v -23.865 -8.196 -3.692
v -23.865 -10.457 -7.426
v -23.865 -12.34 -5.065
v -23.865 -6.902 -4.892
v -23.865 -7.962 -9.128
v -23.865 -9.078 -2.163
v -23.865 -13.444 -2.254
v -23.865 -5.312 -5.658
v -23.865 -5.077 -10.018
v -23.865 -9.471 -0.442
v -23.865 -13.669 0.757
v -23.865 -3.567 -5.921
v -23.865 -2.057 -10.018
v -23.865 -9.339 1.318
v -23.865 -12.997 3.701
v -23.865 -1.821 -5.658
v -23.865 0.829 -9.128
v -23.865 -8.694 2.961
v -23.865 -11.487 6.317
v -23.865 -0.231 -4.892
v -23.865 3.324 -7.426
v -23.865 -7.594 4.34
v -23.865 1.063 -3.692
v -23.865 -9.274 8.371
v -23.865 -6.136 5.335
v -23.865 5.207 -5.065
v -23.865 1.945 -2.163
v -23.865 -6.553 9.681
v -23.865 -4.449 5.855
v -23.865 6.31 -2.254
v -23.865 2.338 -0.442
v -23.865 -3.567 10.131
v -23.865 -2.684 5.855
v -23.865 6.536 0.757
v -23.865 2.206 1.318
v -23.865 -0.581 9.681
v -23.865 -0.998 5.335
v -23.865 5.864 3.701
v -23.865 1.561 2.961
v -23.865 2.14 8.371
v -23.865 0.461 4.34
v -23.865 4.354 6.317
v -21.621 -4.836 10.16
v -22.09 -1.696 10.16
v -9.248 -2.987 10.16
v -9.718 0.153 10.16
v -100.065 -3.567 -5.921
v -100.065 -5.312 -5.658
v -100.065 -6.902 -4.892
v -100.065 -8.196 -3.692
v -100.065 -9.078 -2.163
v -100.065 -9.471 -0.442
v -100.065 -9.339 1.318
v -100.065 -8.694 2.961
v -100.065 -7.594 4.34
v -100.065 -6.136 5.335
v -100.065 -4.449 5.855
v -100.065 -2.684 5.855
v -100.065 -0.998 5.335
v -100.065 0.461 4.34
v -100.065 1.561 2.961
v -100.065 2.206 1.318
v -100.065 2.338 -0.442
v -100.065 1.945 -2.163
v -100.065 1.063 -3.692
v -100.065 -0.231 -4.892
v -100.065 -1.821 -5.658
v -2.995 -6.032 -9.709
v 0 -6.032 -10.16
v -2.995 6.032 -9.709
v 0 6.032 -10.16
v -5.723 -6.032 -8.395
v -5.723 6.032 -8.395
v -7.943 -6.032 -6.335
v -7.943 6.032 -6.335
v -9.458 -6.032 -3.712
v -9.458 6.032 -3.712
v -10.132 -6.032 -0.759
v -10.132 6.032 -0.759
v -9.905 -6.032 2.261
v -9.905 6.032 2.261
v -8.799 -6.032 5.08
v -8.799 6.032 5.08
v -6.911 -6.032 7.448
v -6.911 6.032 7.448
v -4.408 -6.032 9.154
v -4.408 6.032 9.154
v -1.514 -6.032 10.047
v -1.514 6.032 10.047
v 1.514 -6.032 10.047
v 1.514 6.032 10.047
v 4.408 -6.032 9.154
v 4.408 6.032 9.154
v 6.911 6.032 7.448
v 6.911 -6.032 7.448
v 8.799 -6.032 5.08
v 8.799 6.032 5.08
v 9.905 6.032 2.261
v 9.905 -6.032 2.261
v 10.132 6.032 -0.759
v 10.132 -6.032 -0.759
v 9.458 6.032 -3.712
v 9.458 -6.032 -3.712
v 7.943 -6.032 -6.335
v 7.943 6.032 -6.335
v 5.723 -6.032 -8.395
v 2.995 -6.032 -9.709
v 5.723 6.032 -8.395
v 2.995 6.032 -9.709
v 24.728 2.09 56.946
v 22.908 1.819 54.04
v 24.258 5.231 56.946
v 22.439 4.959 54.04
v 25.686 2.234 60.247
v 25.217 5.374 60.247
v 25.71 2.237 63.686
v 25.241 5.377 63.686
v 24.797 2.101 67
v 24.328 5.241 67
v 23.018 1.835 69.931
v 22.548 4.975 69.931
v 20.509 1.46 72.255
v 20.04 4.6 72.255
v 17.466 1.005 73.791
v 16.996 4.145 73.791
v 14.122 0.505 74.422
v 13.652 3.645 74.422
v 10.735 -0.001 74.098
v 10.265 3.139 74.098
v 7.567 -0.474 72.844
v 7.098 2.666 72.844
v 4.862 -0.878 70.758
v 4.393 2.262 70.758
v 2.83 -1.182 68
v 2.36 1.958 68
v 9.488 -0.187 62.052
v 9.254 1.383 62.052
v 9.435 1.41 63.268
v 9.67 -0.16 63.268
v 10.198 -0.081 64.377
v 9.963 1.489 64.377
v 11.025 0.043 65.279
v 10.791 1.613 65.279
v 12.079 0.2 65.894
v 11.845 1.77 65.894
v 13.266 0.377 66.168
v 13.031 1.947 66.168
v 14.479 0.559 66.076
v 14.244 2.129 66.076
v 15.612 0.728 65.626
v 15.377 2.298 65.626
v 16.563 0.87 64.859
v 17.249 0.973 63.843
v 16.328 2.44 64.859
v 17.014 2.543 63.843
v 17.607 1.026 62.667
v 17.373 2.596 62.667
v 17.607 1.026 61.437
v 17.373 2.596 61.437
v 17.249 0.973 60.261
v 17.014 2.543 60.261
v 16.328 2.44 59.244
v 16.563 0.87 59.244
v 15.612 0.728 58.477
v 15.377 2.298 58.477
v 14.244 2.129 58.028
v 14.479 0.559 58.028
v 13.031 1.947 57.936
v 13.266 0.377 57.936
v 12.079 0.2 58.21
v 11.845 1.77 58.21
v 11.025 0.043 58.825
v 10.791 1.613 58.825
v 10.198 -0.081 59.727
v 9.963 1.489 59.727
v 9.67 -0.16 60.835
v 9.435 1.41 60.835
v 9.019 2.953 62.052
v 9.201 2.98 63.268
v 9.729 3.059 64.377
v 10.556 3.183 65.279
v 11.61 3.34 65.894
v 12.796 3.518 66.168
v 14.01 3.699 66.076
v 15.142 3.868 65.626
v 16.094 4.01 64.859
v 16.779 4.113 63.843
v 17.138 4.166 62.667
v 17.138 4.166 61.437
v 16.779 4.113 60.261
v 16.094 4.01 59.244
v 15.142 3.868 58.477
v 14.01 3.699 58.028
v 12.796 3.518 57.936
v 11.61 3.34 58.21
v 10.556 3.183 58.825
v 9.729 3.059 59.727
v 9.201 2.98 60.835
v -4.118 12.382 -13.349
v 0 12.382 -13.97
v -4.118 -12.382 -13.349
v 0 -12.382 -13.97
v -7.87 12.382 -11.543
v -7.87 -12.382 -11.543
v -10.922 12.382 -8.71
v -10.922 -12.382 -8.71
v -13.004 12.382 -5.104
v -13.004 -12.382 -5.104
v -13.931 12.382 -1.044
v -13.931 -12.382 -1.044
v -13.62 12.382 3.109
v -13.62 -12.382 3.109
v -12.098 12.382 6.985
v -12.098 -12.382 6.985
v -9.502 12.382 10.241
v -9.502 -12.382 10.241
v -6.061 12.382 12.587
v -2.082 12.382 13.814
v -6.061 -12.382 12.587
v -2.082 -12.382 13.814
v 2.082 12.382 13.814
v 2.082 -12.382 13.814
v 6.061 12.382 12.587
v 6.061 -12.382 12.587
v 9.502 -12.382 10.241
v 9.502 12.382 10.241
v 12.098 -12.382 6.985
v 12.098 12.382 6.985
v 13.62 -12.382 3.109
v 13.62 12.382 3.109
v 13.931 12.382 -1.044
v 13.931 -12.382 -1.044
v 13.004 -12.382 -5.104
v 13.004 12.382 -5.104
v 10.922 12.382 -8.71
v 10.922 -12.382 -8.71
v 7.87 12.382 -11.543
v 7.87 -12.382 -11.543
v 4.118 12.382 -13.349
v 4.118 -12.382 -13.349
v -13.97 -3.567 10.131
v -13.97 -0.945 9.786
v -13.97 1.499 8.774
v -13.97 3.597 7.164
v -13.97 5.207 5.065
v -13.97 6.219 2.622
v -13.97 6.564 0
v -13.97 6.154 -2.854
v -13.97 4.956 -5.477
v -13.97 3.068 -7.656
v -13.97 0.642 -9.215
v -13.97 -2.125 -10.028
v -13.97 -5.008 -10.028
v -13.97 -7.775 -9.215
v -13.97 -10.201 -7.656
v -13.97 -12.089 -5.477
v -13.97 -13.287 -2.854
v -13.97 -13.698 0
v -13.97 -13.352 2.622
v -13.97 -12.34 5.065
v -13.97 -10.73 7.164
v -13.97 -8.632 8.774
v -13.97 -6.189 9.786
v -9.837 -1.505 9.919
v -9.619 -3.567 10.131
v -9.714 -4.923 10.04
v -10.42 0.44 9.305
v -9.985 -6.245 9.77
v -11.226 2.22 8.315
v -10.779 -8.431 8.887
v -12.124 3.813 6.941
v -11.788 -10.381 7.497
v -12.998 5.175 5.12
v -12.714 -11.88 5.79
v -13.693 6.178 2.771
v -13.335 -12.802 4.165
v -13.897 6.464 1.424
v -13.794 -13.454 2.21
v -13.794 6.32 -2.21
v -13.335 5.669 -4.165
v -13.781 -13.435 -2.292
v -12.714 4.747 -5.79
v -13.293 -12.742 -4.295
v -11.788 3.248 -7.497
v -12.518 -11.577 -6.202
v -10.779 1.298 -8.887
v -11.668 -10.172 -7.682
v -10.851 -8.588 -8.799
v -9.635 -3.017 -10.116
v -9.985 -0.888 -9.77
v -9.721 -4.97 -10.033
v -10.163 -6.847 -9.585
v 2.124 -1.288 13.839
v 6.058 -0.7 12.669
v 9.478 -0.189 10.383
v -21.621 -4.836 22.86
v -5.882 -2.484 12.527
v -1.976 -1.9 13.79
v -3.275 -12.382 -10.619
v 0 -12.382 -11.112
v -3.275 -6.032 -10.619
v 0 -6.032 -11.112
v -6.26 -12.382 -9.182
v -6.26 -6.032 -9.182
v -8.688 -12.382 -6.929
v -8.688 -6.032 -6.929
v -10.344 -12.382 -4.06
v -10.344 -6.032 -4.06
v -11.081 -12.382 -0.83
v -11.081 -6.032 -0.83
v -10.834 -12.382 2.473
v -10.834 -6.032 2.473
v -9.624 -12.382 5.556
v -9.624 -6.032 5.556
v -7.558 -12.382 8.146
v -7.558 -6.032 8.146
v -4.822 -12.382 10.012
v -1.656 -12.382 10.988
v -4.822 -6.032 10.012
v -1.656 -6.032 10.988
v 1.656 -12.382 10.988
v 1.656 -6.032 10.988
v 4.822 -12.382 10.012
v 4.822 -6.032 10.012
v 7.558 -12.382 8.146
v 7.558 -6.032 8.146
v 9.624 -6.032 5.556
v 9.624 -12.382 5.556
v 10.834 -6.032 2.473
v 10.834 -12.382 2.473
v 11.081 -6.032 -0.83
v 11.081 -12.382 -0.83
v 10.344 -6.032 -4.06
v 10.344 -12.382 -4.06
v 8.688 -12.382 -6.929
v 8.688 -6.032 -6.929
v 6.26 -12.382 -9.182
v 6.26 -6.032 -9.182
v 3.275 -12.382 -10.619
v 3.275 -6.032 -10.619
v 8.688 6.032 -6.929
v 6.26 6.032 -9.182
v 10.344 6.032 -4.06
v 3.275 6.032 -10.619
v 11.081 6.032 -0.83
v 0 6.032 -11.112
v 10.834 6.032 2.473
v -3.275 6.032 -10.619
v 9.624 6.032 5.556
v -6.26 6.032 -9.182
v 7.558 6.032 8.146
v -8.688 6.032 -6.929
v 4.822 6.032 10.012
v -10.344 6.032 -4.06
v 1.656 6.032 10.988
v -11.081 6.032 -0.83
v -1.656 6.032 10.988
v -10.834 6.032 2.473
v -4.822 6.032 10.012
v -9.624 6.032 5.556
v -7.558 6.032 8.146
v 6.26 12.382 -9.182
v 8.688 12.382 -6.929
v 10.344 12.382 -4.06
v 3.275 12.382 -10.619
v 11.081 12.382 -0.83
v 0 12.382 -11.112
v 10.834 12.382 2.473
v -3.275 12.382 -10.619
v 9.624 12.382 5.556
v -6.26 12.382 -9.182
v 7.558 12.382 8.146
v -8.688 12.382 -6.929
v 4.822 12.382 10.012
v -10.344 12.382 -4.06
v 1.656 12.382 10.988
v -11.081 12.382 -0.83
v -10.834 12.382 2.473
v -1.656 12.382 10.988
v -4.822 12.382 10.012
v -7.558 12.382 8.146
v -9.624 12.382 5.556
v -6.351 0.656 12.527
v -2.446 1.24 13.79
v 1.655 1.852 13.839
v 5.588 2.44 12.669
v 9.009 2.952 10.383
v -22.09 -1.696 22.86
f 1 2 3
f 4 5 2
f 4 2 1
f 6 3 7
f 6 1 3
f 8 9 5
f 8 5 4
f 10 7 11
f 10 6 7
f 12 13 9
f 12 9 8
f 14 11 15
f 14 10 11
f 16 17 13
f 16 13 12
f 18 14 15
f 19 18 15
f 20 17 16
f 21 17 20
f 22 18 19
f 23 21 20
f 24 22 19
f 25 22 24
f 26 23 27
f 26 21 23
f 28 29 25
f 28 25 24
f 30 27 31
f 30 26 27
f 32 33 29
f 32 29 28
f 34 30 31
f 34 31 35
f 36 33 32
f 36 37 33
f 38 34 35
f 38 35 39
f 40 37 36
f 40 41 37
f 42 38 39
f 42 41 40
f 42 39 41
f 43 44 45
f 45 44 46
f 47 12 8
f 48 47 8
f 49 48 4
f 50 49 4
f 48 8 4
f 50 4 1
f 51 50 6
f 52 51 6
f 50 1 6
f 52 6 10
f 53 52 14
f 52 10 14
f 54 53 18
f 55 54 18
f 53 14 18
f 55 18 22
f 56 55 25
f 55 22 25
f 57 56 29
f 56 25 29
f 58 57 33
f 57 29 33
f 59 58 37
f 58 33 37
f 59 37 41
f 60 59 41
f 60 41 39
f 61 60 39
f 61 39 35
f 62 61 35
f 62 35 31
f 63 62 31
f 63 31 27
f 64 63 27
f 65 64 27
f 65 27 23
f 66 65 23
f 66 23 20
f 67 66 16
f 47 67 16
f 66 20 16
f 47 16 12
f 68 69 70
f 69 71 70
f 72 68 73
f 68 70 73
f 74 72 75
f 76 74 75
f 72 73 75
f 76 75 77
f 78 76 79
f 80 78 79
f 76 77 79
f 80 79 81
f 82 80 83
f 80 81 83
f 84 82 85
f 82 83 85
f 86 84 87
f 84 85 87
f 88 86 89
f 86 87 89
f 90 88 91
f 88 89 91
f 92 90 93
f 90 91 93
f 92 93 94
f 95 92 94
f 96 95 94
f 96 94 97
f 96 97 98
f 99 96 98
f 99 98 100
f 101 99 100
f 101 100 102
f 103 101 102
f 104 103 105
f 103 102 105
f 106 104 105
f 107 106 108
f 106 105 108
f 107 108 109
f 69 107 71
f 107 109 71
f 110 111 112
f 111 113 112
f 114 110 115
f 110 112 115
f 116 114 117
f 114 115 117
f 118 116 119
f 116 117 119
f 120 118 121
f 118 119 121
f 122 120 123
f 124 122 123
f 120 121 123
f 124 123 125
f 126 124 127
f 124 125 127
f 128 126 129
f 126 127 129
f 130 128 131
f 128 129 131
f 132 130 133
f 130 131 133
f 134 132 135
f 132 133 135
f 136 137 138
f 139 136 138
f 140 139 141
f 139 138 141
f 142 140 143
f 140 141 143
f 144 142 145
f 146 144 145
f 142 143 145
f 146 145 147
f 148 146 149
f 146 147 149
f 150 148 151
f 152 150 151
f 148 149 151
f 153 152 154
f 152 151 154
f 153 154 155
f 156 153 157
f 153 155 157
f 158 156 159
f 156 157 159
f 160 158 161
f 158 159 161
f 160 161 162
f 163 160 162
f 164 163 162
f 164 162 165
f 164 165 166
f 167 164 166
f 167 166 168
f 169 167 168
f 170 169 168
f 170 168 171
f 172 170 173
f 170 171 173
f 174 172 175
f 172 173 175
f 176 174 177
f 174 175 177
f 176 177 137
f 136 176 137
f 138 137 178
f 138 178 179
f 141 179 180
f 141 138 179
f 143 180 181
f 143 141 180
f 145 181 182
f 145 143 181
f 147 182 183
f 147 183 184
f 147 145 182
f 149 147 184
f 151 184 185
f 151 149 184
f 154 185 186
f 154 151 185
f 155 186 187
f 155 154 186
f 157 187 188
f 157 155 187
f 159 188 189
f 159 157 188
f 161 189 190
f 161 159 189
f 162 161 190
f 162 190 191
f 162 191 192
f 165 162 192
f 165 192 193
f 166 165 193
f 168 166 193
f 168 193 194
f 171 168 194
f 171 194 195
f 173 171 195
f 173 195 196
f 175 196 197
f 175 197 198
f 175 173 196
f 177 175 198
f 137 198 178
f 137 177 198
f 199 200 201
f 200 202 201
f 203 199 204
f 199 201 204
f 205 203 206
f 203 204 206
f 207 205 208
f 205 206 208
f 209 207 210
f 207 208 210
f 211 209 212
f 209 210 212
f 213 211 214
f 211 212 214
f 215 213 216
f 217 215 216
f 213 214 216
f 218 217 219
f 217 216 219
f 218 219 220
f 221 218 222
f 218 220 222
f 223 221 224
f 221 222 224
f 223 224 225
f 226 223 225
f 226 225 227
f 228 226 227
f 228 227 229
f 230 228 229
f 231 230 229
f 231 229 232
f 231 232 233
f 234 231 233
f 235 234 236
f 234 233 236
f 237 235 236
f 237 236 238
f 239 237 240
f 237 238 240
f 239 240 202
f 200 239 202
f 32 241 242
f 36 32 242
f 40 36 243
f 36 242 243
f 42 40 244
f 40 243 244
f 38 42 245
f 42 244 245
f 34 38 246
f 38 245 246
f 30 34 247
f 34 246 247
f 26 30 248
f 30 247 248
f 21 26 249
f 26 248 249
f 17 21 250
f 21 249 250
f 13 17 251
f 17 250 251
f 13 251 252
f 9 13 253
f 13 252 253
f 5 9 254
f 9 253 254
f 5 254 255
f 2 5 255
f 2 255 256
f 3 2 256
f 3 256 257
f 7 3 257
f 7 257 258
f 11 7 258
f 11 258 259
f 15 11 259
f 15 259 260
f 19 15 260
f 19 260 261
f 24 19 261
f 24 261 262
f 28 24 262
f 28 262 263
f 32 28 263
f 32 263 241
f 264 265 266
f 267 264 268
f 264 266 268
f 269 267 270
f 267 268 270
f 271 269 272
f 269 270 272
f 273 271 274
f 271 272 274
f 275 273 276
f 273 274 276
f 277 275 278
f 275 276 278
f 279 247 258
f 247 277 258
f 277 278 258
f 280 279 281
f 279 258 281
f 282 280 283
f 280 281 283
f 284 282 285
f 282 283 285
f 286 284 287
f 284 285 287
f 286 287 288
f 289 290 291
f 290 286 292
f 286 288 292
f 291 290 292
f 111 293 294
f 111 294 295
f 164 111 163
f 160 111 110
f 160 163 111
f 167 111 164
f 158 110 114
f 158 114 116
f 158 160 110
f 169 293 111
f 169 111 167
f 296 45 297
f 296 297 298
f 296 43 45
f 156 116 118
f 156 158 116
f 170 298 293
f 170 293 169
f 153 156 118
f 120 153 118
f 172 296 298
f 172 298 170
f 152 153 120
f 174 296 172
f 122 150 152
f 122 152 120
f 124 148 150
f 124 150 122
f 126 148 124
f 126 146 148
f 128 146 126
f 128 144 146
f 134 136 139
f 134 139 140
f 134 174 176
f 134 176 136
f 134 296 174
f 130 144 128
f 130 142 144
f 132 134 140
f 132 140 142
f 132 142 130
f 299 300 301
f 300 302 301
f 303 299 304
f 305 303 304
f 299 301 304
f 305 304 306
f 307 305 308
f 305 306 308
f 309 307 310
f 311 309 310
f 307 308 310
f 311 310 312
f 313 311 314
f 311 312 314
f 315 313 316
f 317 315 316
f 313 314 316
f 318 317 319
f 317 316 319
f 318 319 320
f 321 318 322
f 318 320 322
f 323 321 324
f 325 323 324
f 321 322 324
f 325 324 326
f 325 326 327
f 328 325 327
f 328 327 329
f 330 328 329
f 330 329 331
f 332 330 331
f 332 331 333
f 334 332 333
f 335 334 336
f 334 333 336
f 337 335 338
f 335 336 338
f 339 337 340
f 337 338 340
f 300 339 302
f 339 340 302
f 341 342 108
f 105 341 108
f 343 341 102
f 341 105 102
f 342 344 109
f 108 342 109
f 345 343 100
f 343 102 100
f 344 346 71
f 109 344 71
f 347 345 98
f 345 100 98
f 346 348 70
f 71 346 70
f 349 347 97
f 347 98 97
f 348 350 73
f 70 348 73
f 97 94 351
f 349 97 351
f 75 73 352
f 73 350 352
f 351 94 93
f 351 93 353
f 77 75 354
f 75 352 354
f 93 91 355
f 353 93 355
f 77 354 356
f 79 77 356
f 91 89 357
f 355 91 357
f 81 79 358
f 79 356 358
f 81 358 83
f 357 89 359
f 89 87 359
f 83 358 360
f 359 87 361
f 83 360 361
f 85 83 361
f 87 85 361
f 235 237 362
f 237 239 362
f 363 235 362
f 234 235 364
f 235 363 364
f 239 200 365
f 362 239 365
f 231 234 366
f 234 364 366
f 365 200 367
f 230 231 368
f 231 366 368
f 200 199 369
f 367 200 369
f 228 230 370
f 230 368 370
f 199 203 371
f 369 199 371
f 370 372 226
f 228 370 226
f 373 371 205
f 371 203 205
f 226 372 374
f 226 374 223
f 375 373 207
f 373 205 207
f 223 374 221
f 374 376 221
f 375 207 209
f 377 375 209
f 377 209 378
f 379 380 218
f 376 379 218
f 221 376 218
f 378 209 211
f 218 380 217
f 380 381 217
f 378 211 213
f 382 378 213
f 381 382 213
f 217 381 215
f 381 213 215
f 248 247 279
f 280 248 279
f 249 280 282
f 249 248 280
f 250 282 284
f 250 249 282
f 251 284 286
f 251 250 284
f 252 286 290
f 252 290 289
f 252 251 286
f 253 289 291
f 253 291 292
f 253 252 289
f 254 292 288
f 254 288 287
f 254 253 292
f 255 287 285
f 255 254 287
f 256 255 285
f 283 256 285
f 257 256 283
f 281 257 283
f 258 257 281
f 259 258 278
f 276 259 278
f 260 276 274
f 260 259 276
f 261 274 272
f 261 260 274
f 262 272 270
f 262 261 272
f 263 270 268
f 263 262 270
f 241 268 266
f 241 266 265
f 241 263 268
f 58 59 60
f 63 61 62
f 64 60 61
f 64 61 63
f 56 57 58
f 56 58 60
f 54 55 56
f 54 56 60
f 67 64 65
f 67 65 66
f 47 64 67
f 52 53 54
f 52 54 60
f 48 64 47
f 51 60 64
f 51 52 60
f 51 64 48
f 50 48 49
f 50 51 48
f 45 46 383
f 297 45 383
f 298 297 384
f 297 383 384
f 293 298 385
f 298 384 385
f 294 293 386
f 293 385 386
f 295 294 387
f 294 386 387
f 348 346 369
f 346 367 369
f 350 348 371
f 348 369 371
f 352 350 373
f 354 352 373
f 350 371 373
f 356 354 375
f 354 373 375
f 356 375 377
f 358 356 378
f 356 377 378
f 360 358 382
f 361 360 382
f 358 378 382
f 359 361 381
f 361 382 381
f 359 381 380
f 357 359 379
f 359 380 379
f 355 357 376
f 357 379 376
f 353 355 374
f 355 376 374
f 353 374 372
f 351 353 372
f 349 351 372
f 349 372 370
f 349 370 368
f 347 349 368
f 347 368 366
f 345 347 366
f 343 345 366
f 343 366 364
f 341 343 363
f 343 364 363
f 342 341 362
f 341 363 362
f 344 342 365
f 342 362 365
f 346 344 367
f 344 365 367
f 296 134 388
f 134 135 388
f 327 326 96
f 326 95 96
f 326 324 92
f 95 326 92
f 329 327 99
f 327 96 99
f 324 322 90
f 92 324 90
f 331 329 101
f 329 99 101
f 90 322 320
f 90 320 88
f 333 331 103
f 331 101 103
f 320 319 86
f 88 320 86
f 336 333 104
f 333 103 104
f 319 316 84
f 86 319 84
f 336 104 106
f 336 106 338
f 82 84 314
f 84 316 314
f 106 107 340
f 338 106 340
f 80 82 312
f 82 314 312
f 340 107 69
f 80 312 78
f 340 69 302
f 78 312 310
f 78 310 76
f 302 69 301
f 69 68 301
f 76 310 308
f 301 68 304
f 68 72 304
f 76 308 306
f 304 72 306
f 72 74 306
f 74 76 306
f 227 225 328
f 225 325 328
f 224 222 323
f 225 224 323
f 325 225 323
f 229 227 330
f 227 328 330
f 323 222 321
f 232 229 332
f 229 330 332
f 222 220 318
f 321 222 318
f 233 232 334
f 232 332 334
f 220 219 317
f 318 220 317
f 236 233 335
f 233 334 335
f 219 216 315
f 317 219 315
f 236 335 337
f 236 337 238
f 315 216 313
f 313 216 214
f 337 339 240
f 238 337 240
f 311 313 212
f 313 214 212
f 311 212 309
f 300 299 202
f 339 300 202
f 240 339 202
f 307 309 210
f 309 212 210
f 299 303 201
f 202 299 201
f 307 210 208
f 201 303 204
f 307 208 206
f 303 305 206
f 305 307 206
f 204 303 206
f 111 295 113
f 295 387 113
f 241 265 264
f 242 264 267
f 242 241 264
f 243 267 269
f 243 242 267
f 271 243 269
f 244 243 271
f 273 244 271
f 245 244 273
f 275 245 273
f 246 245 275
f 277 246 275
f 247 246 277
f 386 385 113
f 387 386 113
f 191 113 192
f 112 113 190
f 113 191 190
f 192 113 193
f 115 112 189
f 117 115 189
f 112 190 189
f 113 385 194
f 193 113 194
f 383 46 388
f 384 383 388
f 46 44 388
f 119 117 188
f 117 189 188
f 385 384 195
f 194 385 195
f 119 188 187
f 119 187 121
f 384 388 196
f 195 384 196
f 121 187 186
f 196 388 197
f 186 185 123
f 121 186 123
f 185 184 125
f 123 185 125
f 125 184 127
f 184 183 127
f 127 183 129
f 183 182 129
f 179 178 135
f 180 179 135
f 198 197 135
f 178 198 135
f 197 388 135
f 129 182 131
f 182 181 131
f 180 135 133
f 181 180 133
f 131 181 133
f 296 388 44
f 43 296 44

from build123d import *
from build123d.topology import SkipClean

# Parameters (mm, degrees)
SKETCH4_R                            = 4.1275
BOSS_EXTRUDE2_DEPTH                  = 1.5875
BOSS_EXTRUDE2_DEPTH_BACK             = 1.5875
SKETCH5_R                            = 10.130893735
BOSS_EXTRUDE3_DEPTH                  = 9.894953
BOSS_EXTRUDE3_DIRECTION_2_REACH      = 87.304
BOSS_EXTRUDE3_DIRECTION_2_END_RADIUS = 13.97
SKETCH6_R                            = 5.921066373
BOSS_EXTRUDE4_DEPTH                  = 76.2


with BuildPart() as part:
    # Sketch2 → Revolve1 (revolve)
    with BuildSketch(Plane.XY, mode=Mode.PRIVATE) as revolve1_sk:
        Polygon((13.97, 12.3825), (13.97, -12.3825), (11.1125, -12.3825), (11.1125, -6.0325), (10.16, -6.0325), (10.16, 6.0325), (11.1125, 6.0325), (11.1125, 12.3825), align=None)
    revolve(revolve1_sk.sketch.rotate(Axis((0, -12.3825, 0), (0, 1, 0)), 90), axis=Axis((0, -12.3825, 0), (0, 1, 0)))


with BuildPart() as body_2:
    # Sketch4 → Boss-Extrude2 (new, two sides)
    with BuildSketch(Plane(origin=(0, 0, 0), x_dir=(0, 0, -1), z_dir=(-0.14780941112961093, 0.9890158633619168, 0))) as boss_extrude2_sk:
        with BuildLine():
            ThreePointArc((-10.16, 9.588289733), (-13.969031731, 0.164476444), (-10.382944015, -9.346409662))
            Line((-10.382944015, -9.346409662), (-54.039928854, -22.925293076))
            ThreePointArc((-54.039928854, -22.925293076), (-72.254940581, -20.500002013), (-67.999747489, -2.623704278))
            Line((-67.999747489, -2.623704278), (-22.86, 22.098))
            Line((-22.86, 22.098), (-10.16, 22.098))
            Line((-10.16, 22.098), (-10.16, 9.588289733))
        make_face()
        with Locations(Location((-62.0518225, -13.484113782, 0), (0, 0, 90))):
            Circle(SKETCH4_R, mode=Mode.SUBTRACT)
    extrude(amount=BOSS_EXTRUDE2_DEPTH)
    extrude(boss_extrude2_sk.sketch, amount=-BOSS_EXTRUDE2_DEPTH_BACK)


with BuildPart() as body_3:
    # Sketch5 → Boss-Extrude3 (new body)
    with BuildSketch(Plane.ZY.offset(13.97)):
        with Locations((0, -3.566641091)):
            Circle(SKETCH5_R)
    extrude(amount=BOSS_EXTRUDE3_DEPTH)

    # Boss-Extrude3 direction 2: up to this cylinder (the profile starts outside it)
    with SkipClean():  # the faces are left unmerged after this step: merging them gives an invalid solid
        boss_extrude3_direction_2_end = Plane(origin=(0, -3.566641, 0), z_dir=(0, -1, 0)) * Cylinder(BOSS_EXTRUDE3_DIRECTION_2_END_RADIUS, 203.548, mode=Mode.PRIVATE)
        # Sketch5 → Boss-Extrude3 direction 2 (add, up to the surface)
        with BuildSketch(Plane.ZY.offset(13.97), mode=Mode.PRIVATE) as boss_extrude3_direction_2_sk1:
            with Locations((0, -3.566641091)):
                Circle(SKETCH5_R)
        boss_extrude3_direction_2_tool1 = extrude(boss_extrude3_direction_2_sk1.sketch, amount=-BOSS_EXTRUDE3_DIRECTION_2_REACH, mode=Mode.PRIVATE) - boss_extrude3_direction_2_end
        add(boss_extrude3_direction_2_tool1.solids().sort_by_distance((-13.97, -3.566641, 0))[0])
        add(boss_extrude3_direction_2_tool1.solids().sort_by_distance((-13.97, -3.566641, 0))[1])

    # Sketch6 → Boss-Extrude4 (add)
    with BuildSketch(Plane.ZY.offset(23.864952783)):
        with Locations(Location((0, -3.566641091, 0), (0, 0, 180))):
            Circle(SKETCH6_R)
    extrude(amount=BOSS_EXTRUDE4_DEPTH)


solid = Compound([part.part, body_2.part, body_3.part])
